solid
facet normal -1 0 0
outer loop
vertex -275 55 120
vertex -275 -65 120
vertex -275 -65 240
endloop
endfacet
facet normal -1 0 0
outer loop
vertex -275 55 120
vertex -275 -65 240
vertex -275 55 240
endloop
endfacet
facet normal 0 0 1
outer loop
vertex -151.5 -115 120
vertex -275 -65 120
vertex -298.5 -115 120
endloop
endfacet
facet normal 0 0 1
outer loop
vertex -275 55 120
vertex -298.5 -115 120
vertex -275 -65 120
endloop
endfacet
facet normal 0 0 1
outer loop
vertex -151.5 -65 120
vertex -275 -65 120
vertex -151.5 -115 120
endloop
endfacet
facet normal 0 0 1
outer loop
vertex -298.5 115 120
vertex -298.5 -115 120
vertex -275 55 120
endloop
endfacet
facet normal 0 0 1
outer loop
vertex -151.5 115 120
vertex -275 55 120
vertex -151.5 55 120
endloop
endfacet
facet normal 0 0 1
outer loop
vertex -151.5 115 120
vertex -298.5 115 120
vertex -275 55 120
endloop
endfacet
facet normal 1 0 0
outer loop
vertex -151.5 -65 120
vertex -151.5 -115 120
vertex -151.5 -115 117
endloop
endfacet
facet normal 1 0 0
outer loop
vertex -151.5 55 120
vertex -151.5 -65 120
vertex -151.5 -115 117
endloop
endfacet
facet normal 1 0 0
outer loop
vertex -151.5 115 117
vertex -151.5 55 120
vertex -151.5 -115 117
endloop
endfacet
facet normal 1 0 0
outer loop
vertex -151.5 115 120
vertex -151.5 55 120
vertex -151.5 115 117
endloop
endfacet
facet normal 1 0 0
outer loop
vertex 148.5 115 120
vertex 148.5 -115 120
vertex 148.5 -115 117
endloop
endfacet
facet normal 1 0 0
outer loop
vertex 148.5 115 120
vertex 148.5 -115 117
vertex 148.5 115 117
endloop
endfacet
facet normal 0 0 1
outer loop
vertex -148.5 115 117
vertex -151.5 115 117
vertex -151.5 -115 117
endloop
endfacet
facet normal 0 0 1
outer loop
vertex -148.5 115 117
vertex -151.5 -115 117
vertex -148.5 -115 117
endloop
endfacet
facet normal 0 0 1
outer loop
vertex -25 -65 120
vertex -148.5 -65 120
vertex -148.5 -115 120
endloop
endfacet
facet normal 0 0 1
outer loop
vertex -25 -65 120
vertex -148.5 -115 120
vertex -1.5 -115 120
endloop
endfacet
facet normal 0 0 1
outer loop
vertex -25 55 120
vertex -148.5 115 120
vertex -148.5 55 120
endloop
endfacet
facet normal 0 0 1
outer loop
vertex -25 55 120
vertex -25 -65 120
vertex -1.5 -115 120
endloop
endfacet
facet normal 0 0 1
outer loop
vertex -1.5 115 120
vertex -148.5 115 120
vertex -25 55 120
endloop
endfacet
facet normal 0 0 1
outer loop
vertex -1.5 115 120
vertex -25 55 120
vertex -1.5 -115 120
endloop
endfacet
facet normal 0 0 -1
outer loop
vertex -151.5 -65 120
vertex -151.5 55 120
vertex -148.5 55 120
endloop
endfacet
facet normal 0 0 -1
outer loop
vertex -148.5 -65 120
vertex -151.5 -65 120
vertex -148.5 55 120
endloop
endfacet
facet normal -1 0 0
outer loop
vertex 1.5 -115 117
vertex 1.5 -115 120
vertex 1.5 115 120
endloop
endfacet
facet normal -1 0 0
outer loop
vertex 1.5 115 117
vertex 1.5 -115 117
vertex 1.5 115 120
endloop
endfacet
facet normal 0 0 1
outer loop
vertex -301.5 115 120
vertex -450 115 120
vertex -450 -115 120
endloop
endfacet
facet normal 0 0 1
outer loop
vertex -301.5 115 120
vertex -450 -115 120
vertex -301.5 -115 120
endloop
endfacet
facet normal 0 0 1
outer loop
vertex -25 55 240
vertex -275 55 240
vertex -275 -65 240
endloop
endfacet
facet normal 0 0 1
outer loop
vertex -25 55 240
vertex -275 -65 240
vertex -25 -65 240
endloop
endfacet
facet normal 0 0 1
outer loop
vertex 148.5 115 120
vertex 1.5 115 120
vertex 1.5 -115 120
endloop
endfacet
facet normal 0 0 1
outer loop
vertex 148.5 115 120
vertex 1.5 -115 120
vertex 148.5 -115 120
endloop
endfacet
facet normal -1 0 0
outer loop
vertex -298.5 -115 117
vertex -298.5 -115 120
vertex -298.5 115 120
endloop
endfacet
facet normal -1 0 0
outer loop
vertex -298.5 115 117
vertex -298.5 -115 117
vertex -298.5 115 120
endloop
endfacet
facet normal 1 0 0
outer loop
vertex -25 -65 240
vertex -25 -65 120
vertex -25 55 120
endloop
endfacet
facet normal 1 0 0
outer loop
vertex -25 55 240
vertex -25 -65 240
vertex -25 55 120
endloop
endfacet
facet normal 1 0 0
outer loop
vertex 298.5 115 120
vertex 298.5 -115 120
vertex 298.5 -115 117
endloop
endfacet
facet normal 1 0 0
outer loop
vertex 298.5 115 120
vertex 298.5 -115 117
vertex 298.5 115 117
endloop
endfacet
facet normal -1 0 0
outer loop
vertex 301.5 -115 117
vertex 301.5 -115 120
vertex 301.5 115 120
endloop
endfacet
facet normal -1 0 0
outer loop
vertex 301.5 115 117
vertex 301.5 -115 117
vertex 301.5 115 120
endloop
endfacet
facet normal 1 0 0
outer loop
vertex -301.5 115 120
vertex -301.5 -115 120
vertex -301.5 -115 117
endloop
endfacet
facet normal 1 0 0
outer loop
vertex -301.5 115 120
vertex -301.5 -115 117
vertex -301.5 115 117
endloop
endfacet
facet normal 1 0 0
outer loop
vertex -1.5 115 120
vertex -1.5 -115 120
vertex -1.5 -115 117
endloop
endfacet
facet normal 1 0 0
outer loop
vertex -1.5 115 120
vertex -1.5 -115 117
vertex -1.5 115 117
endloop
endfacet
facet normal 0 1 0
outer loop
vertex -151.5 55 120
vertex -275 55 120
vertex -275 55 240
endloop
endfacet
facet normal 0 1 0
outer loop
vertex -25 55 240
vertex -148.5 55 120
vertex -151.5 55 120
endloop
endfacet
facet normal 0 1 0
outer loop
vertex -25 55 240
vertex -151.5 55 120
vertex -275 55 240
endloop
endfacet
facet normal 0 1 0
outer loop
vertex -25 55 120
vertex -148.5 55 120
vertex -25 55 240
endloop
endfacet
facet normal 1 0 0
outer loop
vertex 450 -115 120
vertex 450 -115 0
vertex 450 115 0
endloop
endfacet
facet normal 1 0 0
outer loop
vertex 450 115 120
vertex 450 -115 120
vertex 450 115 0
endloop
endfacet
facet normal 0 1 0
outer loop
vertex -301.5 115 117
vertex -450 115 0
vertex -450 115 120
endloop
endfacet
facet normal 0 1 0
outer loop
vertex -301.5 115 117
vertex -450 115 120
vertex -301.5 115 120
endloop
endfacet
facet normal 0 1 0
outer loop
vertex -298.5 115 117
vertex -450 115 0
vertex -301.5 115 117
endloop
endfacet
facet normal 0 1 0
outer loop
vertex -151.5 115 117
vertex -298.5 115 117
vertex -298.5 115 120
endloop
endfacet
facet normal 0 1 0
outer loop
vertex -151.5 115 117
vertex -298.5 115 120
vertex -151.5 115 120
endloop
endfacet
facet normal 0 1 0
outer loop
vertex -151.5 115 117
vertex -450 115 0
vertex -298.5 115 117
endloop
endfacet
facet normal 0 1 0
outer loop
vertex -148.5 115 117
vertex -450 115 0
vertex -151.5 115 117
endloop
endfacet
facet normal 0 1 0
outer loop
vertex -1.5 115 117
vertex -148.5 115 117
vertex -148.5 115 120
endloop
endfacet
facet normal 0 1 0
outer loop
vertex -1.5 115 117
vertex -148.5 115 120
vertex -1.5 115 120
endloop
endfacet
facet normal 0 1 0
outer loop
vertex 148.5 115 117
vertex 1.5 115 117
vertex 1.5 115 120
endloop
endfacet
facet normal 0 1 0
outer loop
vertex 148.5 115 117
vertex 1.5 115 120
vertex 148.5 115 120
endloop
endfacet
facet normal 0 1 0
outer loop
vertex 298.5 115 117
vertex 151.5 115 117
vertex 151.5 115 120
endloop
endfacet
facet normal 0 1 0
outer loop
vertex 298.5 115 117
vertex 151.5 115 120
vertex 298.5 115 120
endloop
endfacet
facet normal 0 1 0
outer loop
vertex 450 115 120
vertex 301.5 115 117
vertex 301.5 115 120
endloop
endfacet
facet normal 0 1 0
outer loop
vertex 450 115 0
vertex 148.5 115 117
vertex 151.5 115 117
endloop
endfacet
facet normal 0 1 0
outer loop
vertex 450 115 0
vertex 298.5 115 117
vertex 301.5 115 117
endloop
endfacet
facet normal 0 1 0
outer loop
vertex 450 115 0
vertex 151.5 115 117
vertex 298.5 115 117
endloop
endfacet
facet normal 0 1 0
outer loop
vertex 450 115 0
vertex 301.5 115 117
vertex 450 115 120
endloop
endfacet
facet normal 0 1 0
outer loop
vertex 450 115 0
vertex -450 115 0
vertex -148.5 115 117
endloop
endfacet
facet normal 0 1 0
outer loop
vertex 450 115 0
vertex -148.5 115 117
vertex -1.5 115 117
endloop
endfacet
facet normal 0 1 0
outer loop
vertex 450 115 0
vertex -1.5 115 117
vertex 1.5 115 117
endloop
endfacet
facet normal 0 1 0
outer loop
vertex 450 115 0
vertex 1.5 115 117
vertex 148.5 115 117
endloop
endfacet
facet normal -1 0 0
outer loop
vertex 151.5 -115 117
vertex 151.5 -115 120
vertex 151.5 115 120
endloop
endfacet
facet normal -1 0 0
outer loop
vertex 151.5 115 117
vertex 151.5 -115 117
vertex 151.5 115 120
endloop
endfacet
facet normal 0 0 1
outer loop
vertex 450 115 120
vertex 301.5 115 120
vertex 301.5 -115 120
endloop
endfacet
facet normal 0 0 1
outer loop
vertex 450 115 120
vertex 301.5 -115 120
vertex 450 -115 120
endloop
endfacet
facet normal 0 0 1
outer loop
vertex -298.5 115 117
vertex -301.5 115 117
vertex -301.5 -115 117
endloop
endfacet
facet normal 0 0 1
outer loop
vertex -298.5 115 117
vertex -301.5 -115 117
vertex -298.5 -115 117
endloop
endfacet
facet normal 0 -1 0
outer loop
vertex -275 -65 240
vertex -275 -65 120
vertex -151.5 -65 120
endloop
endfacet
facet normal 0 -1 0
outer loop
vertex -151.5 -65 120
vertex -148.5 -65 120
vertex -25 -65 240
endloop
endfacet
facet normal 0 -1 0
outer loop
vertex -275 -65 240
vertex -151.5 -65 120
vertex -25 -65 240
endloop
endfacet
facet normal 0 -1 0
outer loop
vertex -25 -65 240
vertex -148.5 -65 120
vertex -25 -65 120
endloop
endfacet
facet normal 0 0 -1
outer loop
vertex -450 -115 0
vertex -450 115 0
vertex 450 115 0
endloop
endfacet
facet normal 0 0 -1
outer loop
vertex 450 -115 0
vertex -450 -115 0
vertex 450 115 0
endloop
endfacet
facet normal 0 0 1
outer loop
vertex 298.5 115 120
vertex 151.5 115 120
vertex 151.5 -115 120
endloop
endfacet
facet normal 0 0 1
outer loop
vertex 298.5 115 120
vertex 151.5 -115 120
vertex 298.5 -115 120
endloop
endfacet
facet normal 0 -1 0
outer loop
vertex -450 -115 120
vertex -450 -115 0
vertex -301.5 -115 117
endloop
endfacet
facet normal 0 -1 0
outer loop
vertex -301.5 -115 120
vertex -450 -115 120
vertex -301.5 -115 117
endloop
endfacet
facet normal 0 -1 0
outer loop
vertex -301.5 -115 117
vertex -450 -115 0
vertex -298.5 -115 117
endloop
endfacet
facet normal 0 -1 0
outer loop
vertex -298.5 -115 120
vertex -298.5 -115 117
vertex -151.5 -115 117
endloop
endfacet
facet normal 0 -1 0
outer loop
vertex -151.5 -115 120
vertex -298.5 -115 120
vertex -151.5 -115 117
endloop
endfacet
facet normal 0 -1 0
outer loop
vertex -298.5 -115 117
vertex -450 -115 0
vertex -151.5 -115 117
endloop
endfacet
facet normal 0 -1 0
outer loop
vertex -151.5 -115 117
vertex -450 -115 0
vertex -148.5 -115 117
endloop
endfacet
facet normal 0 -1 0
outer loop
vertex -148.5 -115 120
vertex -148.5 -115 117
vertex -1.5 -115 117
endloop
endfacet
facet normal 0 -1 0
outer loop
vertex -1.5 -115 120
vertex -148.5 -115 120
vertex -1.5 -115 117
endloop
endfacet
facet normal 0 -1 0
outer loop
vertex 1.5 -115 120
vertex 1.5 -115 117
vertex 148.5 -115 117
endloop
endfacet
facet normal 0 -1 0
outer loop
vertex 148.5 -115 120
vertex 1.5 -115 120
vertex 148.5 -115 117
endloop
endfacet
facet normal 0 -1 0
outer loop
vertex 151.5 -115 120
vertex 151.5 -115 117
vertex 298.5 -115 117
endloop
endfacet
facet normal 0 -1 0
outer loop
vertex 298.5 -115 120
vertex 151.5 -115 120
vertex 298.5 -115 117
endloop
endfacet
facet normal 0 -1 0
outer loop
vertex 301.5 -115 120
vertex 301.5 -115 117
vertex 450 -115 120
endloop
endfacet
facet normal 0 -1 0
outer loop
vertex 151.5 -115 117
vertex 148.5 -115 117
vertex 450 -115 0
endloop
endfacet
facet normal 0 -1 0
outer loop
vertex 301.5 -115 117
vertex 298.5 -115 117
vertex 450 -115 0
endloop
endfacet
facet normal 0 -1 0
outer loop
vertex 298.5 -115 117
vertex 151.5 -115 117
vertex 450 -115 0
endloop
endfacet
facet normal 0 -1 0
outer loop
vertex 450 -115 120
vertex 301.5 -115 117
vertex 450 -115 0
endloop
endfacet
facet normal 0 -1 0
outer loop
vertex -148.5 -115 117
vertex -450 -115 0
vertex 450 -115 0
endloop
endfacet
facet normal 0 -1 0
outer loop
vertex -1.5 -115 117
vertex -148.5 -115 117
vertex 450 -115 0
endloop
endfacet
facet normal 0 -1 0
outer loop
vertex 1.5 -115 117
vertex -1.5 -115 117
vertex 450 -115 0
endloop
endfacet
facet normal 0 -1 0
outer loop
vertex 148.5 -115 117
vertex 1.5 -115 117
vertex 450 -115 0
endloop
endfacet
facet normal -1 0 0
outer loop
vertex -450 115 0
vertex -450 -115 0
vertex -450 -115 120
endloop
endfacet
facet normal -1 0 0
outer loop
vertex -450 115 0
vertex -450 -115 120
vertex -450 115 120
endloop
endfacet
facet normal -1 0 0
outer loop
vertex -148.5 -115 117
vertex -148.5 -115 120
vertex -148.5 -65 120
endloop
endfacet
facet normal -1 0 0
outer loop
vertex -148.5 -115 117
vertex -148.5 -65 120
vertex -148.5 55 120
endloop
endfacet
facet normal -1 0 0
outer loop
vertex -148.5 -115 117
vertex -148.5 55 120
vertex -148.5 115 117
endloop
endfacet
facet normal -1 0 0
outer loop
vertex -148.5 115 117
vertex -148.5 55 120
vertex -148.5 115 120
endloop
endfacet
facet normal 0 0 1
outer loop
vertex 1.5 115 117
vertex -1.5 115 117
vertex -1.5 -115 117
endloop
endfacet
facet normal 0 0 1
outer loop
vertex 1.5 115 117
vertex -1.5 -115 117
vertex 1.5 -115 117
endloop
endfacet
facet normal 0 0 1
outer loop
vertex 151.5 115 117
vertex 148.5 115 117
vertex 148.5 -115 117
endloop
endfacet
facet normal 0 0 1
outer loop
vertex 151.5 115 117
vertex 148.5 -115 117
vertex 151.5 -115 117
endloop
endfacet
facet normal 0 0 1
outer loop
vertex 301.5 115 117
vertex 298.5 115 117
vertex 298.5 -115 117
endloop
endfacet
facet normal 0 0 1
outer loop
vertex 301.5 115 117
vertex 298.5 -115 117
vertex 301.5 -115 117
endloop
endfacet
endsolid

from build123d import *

# Parameters (mm, degrees)
SKETCH1_W           = 900
SKETCH1_H           = 230
BOSS_EXTRUDE1_DEPTH = 120
SKETCH2_W           = 3
SKETCH2_H           = 230
CUT_EXTRUDE1_DEPTH  = 3
SKETCH3_W           = 250
SKETCH3_H           = 120
BOSS_EXTRUDE2_DEPTH = 120


with BuildPart() as part:
    # Sketch1 → Boss-Extrude1 (new body)
    with BuildSketch(Plane.XY):
        Rectangle(SKETCH1_W, SKETCH1_H)
    extrude(amount=BOSS_EXTRUDE1_DEPTH)

    # Sketch2 → Cut-Extrude1 (cut)
    with BuildSketch(Plane.XY.offset(120)):
        with Locations((-300, 0)):
            Rectangle(SKETCH2_W, SKETCH2_H)
        with Locations((-150, 0)):
            Rectangle(SKETCH2_W, SKETCH2_H)
        Rectangle(SKETCH2_W, SKETCH2_H)
        with Locations((150, 0)):
            Rectangle(SKETCH2_W, SKETCH2_H)
        with Locations((300, 0)):
            Rectangle(SKETCH2_W, SKETCH2_H)
    extrude(amount=-CUT_EXTRUDE1_DEPTH, mode=Mode.SUBTRACT)

    # Sketch3 → Boss-Extrude2 (add)
    with BuildSketch(Plane.XY.offset(120)):
        with Locations((-150, -5)):
            Rectangle(SKETCH3_W, SKETCH3_H)
    extrude(amount=BOSS_EXTRUDE2_DEPTH)


solid = part.part
